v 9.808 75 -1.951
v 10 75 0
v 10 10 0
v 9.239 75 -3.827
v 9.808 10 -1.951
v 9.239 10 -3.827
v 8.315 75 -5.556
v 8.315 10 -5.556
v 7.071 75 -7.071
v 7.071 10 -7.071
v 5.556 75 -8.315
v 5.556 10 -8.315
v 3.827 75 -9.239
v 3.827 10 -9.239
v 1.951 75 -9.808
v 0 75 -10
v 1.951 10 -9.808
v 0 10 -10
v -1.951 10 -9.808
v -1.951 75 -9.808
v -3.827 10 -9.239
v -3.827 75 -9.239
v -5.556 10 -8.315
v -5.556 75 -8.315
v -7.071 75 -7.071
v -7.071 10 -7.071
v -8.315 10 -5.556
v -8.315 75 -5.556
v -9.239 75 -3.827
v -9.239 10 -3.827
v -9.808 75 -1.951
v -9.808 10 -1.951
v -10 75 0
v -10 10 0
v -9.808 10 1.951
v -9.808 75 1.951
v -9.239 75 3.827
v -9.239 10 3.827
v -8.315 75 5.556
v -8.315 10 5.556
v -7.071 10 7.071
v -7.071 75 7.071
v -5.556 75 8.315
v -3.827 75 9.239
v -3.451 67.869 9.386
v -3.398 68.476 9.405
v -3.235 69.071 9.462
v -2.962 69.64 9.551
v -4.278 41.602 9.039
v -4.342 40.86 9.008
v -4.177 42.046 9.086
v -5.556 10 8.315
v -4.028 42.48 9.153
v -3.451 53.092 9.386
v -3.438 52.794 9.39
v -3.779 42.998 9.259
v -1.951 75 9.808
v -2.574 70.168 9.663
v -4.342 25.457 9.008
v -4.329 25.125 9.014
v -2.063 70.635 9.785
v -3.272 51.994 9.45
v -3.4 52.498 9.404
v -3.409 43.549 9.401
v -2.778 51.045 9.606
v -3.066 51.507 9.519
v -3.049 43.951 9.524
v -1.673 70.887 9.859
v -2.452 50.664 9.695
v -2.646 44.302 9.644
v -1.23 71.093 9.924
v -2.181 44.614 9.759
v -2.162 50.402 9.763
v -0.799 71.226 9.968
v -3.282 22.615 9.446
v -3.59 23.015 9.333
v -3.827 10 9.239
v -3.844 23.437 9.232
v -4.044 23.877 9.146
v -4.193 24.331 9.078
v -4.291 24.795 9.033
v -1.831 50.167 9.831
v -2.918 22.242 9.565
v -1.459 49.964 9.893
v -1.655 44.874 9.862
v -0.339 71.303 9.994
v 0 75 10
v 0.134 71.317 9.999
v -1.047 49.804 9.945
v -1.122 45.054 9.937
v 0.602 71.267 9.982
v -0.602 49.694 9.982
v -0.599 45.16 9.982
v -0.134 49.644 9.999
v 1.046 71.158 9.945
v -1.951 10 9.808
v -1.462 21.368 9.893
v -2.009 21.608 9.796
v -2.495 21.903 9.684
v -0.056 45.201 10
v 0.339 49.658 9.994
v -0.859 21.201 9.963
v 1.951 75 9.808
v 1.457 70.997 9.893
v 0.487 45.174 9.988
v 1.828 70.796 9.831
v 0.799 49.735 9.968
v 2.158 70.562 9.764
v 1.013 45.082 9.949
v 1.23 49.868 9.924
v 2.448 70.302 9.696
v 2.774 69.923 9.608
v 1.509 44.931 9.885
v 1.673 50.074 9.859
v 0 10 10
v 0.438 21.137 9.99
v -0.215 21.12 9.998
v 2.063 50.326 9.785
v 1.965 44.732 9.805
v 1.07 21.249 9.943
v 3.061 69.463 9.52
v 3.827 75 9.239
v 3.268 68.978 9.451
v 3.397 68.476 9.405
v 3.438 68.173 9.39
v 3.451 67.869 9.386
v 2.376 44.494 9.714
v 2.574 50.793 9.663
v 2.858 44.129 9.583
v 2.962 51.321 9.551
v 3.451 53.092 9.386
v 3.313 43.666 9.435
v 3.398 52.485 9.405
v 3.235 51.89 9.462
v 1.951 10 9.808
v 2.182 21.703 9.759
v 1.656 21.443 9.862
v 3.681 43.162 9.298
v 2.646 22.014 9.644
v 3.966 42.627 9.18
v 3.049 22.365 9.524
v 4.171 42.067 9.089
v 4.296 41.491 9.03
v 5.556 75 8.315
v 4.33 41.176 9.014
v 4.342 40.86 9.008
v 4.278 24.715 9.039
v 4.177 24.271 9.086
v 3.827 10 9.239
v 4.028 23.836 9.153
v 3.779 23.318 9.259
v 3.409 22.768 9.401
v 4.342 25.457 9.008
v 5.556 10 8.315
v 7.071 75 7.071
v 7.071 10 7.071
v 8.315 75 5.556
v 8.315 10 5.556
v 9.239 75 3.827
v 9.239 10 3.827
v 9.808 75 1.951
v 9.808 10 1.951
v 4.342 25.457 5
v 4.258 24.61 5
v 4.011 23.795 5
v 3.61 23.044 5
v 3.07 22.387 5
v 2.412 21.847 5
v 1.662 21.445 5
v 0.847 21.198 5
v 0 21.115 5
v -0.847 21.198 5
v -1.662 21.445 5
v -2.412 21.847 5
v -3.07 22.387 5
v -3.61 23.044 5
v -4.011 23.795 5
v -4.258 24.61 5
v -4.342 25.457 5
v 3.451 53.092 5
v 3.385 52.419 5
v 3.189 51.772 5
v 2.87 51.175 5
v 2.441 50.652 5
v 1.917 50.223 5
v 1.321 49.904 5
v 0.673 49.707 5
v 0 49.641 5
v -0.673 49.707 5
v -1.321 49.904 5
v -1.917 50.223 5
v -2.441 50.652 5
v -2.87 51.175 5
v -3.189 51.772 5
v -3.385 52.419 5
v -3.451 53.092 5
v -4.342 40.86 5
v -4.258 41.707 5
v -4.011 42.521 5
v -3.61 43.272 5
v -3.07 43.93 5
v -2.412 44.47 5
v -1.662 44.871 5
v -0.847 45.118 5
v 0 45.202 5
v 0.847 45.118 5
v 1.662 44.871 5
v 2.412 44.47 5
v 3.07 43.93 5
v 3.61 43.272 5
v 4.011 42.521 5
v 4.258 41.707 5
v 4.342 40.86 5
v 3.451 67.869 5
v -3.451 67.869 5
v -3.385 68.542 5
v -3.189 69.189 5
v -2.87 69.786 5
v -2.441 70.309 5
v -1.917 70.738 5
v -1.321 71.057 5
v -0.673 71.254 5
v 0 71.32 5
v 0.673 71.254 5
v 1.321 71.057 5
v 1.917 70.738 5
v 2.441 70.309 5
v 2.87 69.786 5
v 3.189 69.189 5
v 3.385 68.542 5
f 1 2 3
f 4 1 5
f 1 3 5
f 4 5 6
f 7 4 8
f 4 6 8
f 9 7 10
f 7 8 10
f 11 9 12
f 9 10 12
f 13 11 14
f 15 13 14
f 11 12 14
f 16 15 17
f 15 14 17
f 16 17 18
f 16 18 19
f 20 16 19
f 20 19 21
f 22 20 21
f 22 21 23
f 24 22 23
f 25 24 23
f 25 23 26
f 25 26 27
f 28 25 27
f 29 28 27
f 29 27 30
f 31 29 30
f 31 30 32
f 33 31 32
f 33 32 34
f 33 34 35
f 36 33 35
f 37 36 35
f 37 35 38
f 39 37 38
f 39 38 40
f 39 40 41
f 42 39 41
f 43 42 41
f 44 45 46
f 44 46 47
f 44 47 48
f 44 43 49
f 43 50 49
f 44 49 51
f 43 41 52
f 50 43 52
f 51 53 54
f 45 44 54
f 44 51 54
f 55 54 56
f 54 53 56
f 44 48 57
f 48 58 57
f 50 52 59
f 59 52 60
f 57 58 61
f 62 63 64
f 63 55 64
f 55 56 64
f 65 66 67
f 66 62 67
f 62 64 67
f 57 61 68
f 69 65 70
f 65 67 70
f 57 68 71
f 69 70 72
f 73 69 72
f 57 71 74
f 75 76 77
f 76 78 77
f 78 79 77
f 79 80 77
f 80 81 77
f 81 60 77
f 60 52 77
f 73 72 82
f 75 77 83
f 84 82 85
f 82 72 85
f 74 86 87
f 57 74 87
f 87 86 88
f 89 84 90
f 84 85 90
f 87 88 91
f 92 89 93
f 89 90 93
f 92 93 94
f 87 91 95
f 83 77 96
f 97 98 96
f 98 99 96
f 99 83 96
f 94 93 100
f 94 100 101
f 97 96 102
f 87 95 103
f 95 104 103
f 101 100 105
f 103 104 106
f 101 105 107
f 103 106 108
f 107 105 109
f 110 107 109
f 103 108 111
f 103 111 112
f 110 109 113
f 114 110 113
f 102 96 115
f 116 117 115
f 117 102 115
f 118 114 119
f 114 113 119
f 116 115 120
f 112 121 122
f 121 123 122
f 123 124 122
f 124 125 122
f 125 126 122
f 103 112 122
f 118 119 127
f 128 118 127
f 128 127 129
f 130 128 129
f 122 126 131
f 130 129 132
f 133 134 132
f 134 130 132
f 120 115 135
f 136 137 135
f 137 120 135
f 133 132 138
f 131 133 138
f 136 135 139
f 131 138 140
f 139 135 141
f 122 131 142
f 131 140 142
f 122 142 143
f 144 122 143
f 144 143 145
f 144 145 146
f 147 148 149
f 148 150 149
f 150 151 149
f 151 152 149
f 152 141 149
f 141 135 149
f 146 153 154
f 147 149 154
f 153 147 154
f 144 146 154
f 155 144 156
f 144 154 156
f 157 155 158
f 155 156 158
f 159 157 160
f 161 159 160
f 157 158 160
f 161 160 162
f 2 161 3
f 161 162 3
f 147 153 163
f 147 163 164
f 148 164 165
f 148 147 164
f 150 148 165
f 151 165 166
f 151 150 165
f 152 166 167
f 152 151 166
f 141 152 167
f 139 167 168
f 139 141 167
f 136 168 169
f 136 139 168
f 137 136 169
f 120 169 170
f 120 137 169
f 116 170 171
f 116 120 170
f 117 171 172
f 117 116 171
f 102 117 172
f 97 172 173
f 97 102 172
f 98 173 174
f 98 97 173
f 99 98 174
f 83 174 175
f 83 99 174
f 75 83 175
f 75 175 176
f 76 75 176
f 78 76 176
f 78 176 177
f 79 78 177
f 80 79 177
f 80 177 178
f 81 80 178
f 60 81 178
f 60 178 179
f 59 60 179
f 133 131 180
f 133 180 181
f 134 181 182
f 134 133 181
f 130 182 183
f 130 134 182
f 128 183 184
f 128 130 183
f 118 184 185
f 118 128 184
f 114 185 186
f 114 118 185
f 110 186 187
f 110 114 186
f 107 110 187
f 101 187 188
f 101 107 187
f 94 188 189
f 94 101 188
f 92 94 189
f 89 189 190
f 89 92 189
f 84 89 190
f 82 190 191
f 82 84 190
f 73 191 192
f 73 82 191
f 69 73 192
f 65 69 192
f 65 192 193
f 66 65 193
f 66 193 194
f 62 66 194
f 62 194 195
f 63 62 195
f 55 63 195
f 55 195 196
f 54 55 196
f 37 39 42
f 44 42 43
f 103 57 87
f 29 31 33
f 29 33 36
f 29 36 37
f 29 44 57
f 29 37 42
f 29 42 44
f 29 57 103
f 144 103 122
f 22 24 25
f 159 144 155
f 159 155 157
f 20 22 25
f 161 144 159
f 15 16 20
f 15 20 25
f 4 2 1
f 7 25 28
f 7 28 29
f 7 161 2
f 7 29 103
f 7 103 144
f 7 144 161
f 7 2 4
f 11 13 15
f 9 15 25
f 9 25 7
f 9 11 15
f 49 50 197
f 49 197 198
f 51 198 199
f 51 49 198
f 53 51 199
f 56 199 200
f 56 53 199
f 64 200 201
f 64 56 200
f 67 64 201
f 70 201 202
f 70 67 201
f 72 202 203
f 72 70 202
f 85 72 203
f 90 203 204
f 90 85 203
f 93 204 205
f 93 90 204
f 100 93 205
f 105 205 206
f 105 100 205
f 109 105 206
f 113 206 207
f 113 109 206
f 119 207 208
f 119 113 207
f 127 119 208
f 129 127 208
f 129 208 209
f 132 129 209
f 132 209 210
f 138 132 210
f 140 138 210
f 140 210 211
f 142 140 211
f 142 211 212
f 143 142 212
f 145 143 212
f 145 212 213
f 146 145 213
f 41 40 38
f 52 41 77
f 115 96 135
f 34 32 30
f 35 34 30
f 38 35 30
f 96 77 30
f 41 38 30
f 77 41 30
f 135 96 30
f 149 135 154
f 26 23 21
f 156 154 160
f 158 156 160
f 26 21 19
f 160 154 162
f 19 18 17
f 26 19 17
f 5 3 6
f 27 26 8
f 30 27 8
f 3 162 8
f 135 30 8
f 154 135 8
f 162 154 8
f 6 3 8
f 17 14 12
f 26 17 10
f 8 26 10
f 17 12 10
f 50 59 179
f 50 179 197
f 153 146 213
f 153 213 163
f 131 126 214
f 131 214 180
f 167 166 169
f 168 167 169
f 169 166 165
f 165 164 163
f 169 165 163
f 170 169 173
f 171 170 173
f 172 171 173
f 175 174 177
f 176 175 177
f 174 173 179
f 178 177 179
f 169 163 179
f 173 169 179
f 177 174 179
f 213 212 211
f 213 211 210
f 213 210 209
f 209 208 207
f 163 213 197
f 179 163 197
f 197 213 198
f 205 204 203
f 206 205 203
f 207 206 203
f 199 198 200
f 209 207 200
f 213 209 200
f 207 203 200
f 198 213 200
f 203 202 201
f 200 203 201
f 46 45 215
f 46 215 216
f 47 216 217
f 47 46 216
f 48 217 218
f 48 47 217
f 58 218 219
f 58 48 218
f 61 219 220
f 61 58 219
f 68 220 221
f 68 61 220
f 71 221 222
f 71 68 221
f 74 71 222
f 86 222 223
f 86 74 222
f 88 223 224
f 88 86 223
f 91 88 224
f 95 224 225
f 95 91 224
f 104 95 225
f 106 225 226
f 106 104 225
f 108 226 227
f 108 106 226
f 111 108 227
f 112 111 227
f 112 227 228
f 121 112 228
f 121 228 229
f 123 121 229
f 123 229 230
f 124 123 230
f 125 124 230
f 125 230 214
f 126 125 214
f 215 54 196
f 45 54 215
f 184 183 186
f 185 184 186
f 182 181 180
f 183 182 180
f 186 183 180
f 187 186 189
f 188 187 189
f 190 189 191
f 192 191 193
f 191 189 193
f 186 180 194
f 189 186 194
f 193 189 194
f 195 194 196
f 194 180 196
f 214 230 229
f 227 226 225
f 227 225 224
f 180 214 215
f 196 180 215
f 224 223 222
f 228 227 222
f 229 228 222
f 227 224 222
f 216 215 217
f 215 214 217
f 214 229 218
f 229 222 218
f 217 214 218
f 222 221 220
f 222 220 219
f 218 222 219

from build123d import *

# Parameters (mm, degrees)
SKETCH_2_R          = 10
EXTRUDE_1_DEPTH     = 65
CUT_EXTRUDE_2_DEPTH = 5
CUT_EXTRUDE_3_DEPTH = 5


with BuildPart() as part:
    # 草图2 → 凸台-拉伸1 (new body)
    with BuildSketch(Plane(origin=(0, 10, 0), x_dir=(1, 0, 0), z_dir=(0, 1, 0))):
        Circle(SKETCH_2_R)
    extrude(amount=EXTRUDE_1_DEPTH)

    # 草图5 → 切除-拉伸2 (cut)
    with BuildSketch(Plane.XY.offset(10)):
        with BuildLine():
            Line((4.341808906, 40.859733082), (4.341808906, 25.456649106))
            ThreePointArc((4.341808906, 25.456649106), (0, 21.114840199), (-4.341808906, 25.456649106))
            Line((-4.341808906, 25.456649106), (-4.341808906, 40.859733082))
            ThreePointArc((-4.341808906, 40.859733082), (0, 45.201541988), (4.341808906, 40.859733082))
        make_face()
    extrude(amount=-CUT_EXTRUDE_2_DEPTH, mode=Mode.SUBTRACT)

    # 草图6 → 切除-拉伸3 (cut)
    with BuildSketch(Plane.XY.offset(10)):
        with BuildLine():
            Line((3.451393492, 67.868636429), (3.451393492, 53.092358039))
            ThreePointArc((3.451393492, 53.092358039), (0, 49.640964547), (-3.451393492, 53.092358039))
            Line((-3.451393492, 53.092358039), (-3.451393492, 67.868636429))
            ThreePointArc((-3.451393492, 67.868636429), (0, 71.320029921), (3.451393492, 67.868636429))
        make_face()
    extrude(amount=-CUT_EXTRUDE_3_DEPTH, mode=Mode.SUBTRACT)


solid = part.part
